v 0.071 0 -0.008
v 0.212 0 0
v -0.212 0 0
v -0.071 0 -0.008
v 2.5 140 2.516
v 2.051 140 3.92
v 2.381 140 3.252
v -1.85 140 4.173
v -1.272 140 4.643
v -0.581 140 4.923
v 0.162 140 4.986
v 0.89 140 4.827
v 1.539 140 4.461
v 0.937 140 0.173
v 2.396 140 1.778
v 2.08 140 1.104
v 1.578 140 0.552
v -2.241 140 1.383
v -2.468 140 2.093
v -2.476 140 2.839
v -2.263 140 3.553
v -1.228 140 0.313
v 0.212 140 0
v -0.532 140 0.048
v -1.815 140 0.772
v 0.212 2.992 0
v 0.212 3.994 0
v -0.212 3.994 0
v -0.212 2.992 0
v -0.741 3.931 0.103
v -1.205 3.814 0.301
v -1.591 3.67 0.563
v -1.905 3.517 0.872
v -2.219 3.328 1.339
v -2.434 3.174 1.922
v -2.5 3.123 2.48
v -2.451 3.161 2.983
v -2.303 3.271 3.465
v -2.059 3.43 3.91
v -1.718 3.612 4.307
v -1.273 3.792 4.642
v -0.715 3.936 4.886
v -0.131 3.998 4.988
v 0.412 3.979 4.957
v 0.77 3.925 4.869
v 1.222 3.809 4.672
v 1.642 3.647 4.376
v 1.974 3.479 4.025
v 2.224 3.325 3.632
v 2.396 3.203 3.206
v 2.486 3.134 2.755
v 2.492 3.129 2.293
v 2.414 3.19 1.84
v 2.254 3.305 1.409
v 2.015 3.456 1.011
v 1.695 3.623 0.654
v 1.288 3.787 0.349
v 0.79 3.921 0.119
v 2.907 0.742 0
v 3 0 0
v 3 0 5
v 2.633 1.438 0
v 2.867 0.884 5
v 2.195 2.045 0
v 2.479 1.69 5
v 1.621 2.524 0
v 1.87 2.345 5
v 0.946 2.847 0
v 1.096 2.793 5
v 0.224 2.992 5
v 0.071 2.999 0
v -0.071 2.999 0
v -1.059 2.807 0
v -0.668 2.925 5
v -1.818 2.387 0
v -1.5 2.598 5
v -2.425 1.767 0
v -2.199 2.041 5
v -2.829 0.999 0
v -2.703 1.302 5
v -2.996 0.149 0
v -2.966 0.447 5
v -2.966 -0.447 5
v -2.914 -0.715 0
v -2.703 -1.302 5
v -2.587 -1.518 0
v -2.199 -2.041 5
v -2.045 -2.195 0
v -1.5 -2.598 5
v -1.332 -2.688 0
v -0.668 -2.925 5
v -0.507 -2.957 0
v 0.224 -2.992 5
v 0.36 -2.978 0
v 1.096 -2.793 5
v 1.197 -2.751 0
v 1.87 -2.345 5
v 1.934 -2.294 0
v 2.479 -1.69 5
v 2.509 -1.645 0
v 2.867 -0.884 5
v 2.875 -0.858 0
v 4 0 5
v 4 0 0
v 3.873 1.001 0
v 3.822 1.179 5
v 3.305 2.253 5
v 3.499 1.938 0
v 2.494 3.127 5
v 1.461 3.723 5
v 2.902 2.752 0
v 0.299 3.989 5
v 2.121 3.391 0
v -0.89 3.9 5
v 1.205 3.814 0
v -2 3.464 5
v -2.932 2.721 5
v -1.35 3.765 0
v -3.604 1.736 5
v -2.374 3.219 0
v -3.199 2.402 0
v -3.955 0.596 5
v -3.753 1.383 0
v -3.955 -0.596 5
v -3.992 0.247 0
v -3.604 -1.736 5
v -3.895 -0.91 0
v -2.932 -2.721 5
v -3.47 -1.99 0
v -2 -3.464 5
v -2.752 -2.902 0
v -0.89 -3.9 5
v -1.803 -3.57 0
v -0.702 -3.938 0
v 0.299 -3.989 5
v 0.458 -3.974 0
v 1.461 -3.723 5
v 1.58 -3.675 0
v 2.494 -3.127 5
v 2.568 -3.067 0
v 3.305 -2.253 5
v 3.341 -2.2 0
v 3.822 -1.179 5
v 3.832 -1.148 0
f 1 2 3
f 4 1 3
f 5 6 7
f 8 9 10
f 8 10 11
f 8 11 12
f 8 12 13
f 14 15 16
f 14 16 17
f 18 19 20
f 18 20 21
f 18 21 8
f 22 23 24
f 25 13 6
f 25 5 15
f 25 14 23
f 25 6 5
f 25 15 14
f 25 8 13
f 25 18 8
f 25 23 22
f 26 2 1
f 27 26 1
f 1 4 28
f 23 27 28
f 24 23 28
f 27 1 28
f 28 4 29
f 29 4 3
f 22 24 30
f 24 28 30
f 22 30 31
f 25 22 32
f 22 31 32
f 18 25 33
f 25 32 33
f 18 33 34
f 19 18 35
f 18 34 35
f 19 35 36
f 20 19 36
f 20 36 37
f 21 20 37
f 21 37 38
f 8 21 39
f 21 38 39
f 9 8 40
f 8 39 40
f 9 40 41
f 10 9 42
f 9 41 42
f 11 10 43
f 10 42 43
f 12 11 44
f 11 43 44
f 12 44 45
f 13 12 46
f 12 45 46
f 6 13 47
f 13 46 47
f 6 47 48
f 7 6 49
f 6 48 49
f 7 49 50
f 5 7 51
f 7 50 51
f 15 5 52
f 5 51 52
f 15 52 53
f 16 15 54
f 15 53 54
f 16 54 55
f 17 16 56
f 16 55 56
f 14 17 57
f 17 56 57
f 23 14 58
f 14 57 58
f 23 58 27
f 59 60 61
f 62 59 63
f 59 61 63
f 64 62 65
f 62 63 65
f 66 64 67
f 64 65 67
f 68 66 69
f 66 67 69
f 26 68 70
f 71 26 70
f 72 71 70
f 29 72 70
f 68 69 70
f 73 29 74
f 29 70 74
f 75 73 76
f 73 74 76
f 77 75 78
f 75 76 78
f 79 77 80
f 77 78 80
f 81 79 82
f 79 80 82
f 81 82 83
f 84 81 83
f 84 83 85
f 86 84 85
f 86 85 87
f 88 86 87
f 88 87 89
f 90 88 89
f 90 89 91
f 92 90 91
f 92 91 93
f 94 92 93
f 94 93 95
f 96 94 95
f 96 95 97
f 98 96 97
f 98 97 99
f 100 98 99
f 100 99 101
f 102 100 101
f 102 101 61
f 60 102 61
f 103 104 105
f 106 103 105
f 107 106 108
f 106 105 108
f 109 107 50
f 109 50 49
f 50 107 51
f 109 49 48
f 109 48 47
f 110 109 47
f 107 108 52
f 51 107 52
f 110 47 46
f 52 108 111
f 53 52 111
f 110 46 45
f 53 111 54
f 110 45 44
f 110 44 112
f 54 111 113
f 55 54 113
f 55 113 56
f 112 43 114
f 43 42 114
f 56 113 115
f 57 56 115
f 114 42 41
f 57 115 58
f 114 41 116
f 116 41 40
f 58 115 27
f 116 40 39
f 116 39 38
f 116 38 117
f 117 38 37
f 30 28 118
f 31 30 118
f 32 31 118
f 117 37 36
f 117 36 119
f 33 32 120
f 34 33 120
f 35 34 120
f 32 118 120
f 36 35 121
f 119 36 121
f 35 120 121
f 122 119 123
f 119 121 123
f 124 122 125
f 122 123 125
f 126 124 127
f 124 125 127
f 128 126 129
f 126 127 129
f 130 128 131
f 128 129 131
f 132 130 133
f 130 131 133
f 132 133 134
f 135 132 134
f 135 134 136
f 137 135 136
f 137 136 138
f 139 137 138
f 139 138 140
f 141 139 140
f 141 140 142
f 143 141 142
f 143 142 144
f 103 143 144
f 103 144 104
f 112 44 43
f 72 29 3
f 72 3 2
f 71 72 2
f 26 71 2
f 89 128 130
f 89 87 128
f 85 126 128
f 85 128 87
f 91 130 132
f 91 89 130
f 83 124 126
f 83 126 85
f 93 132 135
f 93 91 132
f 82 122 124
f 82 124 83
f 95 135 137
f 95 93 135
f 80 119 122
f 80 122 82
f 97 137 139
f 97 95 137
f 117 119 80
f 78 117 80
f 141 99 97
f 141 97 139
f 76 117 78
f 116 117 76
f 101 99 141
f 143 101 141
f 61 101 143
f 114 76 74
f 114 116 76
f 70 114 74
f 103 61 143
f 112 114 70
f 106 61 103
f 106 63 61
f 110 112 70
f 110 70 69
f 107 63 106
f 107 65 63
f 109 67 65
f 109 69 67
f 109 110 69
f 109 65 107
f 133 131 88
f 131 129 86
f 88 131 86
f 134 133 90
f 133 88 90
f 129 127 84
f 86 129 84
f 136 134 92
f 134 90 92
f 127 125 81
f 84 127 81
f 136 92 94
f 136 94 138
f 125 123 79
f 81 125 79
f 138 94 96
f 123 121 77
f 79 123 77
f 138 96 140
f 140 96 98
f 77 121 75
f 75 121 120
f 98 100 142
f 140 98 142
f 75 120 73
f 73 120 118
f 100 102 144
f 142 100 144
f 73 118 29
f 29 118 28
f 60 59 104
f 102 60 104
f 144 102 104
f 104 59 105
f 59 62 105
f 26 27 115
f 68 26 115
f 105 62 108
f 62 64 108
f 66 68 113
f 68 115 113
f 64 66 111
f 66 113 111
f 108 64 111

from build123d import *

# Parameters (mm, degrees)
SKETCH_1_R          = 4
EXTRUDE_1_DEPTH     = 5
SKETCH_3_R          = 2.5
EXTRUDE_2_DEPTH     = 140
SKETCH_2_R          = 3
CUT_EXTRUDE_1_DEPTH = 5


with BuildPart() as part:
    # 草图1 → 凸台-拉伸1 (new body)
    with BuildSketch(Plane.XY):
        Circle(SKETCH_1_R)
    extrude(amount=EXTRUDE_1_DEPTH)

    # 草图3 → 凸台-拉伸2 (add)
    with BuildSketch(Plane(origin=(0, 0, 0), x_dir=(1, 0, 0), z_dir=(0, 1, 0))):
        with Locations(Location((0, -2.490986951, 0), (0, 0, 85.133305815))):
            Circle(SKETCH_3_R)
    extrude(amount=EXTRUDE_2_DEPTH)

    # 草图2 → 切除-拉伸1 (cut)
    with BuildSketch(Plane.XY.offset(5)):
        Circle(SKETCH_2_R)
    extrude(amount=-CUT_EXTRUDE_1_DEPTH, mode=Mode.SUBTRACT)


solid = part.part
